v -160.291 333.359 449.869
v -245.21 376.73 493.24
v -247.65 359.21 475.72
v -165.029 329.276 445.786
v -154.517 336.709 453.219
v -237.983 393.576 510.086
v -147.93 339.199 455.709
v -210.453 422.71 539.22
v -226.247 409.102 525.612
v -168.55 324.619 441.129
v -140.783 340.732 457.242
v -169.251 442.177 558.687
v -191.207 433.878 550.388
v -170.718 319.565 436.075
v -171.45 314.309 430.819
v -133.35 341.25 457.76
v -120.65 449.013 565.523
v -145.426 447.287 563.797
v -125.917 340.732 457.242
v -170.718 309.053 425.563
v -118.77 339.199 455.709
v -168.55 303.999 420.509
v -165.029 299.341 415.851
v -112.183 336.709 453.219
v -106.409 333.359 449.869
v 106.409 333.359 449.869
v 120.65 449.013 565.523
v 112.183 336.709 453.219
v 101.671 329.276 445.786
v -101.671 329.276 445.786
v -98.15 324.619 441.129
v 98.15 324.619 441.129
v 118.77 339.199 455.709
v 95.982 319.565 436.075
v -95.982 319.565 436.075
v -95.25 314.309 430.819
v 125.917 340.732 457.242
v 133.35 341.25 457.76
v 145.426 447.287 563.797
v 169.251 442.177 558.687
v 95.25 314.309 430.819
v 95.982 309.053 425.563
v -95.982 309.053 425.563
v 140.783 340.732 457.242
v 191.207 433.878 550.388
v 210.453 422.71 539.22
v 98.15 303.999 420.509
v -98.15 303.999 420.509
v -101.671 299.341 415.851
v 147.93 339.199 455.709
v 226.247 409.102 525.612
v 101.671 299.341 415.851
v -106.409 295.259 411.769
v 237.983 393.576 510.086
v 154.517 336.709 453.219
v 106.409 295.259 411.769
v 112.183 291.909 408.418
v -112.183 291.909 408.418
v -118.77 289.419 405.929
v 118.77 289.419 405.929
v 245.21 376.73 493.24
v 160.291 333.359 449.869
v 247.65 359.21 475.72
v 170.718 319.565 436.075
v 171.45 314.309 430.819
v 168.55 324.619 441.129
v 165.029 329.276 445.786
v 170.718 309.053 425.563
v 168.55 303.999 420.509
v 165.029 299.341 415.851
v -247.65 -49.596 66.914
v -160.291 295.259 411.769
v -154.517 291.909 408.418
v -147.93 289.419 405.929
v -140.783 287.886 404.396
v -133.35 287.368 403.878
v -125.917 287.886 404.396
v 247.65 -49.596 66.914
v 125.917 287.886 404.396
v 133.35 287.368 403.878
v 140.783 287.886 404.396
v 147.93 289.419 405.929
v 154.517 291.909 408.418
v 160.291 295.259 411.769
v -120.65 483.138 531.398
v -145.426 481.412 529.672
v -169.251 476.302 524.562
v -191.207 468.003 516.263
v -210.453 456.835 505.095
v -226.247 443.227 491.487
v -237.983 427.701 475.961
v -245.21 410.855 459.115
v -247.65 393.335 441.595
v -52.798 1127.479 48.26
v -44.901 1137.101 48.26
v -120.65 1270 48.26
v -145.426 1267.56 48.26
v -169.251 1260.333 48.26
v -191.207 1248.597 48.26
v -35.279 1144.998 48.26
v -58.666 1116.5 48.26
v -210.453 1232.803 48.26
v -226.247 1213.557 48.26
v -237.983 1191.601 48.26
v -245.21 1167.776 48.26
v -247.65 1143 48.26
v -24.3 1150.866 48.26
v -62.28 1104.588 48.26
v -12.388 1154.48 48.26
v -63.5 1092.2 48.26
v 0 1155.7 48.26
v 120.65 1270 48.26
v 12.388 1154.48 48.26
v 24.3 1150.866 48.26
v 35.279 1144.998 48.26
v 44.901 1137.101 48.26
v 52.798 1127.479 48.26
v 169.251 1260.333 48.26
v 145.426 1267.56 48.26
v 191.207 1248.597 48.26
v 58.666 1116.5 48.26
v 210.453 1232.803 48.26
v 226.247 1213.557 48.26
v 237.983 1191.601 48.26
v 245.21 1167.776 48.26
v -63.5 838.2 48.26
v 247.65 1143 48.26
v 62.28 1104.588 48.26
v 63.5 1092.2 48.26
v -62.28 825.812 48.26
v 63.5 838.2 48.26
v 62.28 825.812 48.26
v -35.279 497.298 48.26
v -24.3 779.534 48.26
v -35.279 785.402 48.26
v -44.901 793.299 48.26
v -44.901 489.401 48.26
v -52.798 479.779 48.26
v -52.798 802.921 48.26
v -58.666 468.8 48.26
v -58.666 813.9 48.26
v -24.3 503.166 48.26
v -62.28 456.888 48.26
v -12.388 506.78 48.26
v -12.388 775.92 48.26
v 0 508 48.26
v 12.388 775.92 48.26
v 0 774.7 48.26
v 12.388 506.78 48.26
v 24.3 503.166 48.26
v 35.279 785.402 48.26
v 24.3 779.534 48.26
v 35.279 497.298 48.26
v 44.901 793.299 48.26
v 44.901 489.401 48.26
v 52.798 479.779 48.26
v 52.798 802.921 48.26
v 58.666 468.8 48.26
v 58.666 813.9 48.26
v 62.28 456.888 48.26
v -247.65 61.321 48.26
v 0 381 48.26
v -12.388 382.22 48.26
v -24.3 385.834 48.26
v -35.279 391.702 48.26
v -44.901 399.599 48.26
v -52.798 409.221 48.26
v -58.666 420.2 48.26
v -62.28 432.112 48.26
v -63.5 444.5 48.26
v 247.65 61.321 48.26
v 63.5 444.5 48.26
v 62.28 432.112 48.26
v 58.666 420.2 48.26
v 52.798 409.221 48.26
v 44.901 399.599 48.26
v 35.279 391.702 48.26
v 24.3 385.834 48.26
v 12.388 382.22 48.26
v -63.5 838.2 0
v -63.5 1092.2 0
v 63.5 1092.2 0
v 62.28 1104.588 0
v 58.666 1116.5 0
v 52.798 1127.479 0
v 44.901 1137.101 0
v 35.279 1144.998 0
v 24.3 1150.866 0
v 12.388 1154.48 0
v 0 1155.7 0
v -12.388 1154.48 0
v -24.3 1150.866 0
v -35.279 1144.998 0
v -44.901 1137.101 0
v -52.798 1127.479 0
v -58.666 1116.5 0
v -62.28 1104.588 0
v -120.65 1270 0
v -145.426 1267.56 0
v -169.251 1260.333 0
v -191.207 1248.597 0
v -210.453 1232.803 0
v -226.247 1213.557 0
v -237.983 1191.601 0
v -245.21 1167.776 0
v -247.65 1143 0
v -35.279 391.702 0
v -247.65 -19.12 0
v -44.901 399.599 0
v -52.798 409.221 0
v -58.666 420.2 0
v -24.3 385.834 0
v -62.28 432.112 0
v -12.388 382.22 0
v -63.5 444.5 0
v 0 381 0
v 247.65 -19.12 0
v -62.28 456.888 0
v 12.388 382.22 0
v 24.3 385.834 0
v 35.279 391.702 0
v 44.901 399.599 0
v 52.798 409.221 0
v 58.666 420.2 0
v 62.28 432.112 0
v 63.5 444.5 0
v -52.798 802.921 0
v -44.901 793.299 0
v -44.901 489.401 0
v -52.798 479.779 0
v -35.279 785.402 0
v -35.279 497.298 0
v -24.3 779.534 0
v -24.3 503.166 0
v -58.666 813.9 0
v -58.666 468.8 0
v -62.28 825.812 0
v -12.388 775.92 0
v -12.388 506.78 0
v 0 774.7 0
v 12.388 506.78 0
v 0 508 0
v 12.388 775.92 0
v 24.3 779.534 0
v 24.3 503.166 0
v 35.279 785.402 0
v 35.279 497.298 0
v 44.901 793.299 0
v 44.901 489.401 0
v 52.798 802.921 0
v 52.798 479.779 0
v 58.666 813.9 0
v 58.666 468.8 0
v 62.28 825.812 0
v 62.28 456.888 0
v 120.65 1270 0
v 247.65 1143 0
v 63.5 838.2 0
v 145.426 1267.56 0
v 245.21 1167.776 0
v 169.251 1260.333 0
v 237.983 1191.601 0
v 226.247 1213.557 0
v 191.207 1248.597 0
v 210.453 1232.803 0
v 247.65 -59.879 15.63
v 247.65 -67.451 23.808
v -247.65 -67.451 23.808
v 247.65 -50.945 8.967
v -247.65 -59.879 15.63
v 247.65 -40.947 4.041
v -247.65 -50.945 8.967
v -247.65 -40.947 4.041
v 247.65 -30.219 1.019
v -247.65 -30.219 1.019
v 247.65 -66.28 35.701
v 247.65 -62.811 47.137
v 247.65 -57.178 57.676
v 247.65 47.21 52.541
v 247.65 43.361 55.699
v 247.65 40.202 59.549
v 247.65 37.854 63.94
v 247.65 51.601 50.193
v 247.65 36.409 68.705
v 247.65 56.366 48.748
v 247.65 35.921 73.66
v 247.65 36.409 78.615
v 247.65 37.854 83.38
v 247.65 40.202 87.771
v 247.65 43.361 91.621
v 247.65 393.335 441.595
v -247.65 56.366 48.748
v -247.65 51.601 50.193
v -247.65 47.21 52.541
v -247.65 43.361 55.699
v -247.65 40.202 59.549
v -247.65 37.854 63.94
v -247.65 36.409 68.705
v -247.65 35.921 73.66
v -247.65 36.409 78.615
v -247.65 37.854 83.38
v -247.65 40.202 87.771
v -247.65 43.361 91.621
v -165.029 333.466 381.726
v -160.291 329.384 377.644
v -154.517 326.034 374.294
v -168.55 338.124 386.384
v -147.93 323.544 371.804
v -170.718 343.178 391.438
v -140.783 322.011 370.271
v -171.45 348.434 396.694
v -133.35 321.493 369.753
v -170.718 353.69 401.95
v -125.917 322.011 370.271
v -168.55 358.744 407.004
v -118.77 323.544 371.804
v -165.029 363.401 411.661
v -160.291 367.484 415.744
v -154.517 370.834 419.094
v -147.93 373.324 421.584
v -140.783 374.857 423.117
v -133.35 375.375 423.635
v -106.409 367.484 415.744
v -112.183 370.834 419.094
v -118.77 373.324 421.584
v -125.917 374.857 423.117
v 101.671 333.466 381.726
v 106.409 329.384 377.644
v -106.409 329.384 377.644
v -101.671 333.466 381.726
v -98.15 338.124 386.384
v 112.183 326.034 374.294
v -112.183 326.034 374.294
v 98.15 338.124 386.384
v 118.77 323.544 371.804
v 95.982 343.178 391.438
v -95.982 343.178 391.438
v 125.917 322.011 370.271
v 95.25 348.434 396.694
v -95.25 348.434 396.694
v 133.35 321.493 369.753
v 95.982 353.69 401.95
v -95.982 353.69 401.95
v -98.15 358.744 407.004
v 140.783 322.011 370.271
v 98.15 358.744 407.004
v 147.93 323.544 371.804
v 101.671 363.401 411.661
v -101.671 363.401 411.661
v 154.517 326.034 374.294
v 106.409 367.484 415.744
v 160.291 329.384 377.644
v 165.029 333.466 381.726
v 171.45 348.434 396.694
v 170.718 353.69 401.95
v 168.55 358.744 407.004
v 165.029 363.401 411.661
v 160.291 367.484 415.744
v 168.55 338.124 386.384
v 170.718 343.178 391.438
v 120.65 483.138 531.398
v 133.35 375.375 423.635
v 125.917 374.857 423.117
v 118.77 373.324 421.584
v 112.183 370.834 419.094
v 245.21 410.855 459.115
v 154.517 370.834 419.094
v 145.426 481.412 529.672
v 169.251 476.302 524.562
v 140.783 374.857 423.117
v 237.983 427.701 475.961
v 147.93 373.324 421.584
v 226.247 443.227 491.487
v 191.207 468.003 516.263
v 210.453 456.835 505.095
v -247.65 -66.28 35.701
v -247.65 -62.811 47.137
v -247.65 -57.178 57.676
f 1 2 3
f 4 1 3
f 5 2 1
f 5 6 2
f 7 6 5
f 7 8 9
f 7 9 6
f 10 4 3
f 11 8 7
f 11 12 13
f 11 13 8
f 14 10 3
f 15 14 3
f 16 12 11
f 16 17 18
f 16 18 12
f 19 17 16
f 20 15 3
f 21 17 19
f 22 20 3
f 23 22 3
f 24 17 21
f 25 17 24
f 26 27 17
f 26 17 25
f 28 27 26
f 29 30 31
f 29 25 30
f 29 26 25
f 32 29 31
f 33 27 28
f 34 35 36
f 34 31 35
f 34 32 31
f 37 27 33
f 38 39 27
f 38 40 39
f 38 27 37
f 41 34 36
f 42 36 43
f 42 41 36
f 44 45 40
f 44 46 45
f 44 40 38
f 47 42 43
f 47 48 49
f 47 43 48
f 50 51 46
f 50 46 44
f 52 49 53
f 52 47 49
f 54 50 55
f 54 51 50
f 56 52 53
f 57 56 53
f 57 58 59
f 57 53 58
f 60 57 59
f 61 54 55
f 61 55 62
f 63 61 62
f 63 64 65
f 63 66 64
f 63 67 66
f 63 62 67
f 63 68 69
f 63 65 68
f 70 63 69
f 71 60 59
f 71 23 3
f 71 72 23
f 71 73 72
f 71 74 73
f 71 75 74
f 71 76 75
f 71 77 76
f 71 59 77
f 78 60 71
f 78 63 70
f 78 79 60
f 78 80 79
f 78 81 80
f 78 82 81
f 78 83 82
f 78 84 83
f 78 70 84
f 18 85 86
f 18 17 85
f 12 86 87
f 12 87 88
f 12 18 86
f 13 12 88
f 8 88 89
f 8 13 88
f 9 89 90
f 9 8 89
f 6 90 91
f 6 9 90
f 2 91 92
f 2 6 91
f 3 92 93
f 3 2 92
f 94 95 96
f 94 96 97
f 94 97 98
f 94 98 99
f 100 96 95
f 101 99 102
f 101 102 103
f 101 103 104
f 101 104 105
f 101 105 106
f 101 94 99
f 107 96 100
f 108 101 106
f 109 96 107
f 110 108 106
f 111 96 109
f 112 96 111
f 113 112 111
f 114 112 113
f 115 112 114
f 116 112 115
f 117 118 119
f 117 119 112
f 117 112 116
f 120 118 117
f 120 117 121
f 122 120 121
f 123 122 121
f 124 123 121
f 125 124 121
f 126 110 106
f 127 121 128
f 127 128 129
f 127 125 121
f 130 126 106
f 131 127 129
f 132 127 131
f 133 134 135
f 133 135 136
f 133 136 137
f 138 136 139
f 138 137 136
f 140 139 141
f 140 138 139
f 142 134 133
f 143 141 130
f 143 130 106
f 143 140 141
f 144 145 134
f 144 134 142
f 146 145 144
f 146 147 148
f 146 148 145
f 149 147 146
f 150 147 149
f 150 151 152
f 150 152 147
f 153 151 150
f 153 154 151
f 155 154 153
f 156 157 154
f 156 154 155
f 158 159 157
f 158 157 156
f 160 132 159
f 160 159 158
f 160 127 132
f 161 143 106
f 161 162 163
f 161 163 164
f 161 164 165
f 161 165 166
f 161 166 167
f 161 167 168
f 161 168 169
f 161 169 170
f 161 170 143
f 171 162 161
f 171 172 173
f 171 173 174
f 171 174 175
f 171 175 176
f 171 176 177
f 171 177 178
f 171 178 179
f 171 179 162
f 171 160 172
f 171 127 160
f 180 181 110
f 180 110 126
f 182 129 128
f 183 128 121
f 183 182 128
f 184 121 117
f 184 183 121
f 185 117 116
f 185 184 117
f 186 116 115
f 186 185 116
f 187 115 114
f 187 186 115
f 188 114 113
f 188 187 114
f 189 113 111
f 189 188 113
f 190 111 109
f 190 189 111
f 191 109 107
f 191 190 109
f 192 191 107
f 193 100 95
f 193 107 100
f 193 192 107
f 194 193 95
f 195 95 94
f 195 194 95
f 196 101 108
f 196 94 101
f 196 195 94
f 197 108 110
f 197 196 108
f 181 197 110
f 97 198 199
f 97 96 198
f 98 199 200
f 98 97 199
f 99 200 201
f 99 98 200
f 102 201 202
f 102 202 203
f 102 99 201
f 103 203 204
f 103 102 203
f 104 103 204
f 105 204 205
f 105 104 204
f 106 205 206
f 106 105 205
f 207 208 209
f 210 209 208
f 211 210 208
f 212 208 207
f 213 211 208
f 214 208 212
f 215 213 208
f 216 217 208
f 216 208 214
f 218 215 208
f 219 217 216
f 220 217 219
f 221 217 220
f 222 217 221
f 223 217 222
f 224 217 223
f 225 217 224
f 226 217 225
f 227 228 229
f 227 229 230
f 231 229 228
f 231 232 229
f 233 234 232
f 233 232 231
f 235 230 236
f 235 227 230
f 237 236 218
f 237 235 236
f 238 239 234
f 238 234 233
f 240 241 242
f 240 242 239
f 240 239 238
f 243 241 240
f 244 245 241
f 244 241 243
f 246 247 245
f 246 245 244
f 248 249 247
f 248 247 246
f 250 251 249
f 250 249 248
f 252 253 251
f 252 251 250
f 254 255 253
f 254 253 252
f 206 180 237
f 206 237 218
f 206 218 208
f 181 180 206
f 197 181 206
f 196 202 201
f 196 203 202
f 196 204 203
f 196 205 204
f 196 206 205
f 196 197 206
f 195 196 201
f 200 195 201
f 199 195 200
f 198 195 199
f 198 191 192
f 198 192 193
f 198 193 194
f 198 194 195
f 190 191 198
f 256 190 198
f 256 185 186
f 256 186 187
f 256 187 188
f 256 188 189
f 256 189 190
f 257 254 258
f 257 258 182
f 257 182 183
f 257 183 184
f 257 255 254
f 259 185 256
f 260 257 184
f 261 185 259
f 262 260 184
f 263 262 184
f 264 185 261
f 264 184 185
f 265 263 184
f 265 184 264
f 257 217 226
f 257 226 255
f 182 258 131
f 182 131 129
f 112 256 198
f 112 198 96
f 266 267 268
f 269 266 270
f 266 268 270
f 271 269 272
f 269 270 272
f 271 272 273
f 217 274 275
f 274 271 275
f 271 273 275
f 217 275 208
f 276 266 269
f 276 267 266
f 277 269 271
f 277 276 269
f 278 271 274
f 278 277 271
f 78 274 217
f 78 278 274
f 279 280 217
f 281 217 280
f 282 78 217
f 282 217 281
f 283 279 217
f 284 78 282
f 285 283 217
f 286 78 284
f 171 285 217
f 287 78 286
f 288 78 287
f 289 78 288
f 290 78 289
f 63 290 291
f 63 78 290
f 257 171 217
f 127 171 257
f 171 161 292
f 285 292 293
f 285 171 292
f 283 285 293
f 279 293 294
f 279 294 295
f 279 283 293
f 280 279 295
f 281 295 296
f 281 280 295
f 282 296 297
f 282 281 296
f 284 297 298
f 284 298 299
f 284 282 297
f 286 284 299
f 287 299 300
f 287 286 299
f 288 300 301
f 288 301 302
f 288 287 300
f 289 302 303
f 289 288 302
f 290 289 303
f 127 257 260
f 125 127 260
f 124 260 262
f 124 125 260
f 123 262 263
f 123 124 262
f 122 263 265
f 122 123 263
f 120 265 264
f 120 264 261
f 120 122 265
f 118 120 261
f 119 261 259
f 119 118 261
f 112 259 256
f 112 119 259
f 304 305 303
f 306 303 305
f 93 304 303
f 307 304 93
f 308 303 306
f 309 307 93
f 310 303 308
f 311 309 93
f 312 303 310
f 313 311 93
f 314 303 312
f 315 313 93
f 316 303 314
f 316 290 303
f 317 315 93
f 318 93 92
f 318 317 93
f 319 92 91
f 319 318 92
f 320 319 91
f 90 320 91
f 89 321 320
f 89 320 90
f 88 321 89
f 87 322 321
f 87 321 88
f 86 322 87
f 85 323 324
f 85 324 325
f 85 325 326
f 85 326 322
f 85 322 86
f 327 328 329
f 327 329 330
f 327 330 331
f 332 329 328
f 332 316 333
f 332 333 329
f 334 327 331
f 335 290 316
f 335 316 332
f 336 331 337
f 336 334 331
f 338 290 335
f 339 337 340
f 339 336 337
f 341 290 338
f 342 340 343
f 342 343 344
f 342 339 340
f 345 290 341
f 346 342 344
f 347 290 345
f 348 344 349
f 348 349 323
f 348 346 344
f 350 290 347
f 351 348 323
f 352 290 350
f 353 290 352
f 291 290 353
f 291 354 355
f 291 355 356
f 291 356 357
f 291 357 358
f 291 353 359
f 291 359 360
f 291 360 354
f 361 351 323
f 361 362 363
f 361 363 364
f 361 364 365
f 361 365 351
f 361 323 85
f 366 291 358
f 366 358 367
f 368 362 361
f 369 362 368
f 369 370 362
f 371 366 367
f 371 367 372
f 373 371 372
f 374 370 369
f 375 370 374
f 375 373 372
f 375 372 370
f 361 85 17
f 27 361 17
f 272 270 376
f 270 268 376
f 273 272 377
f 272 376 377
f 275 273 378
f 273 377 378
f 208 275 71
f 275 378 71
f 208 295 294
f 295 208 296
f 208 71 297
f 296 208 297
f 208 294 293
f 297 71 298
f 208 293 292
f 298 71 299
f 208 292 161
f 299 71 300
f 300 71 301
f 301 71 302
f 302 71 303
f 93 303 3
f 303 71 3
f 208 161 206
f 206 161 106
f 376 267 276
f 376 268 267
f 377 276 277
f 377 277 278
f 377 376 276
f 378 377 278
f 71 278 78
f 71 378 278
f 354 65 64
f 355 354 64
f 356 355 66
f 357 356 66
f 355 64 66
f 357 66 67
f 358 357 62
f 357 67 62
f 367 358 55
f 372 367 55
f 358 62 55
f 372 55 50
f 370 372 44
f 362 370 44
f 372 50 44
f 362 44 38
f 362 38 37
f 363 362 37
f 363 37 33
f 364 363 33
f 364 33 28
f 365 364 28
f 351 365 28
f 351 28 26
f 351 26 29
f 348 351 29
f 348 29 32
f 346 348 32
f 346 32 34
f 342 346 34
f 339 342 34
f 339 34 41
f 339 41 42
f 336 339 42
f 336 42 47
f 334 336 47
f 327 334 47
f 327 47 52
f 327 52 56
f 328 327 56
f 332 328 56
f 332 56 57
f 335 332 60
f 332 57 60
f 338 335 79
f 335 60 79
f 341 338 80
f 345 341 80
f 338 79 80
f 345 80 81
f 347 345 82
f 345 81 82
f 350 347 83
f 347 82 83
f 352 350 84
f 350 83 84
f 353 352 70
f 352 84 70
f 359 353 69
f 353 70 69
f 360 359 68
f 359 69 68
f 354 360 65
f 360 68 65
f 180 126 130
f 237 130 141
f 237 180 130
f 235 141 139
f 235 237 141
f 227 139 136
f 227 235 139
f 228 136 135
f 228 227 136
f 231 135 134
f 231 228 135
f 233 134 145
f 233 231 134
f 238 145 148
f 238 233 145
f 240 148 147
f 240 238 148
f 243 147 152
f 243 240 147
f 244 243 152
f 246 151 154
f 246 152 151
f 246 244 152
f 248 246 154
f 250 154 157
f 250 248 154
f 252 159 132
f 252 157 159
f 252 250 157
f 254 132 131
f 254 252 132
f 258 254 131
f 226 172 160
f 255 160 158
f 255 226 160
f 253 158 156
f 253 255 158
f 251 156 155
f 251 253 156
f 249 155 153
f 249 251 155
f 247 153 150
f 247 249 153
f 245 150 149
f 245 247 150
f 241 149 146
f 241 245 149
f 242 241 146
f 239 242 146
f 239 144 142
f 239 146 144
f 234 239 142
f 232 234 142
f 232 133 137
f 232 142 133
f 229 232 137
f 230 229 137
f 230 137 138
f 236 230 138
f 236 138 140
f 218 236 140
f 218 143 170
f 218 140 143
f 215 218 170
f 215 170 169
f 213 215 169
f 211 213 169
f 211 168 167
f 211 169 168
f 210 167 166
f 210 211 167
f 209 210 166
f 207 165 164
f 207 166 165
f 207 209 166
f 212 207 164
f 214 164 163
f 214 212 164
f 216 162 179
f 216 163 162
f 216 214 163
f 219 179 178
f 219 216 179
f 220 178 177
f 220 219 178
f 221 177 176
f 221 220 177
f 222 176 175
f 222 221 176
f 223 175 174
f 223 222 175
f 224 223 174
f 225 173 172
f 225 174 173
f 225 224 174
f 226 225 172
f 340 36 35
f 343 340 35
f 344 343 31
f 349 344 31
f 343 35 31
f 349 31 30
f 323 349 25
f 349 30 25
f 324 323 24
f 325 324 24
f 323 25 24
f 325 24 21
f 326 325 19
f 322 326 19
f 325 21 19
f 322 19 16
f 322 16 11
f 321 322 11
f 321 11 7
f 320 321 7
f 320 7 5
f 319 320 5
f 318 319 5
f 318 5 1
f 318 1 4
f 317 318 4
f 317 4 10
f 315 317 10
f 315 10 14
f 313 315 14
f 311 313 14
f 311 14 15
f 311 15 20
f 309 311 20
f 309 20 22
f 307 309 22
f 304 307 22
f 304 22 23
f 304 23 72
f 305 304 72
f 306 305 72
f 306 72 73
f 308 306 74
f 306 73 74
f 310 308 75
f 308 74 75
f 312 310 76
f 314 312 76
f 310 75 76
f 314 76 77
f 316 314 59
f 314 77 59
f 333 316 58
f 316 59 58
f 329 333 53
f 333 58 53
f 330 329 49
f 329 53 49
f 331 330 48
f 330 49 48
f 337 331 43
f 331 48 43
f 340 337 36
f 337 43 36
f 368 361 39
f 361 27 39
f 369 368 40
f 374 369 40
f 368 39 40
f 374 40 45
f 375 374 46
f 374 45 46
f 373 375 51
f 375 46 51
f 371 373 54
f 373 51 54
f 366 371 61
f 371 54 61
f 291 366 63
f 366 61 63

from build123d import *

# Parameters (mm, degrees)
F1_DEPTH    = 247.65
F2_R        = 127
F3_R        = 25.4
F4_R        = 60.96
F5_T1_DEPTH = 736.9542394832
F6_R        = 38.1
F7_DEPTH    = 132.08
F8_R        = 63.5
F9_DEPTH    = 111.76


# Not quite as in the source:
# - a fillet or chamfer that OpenCascade refuses, or shapes differently, is made with other operations: its cross-section is extruded or revolved along the edge and cut away or added


with BuildPart() as f1:
    # F0 (on Right) → F1 (new body, symmetric)
    with BuildSketch(Plane.YZ):
        Polygon((-67.451213715, 0), (0, 0), (1270, 0), (1270, 48.26), (0, 48.26), (483.1377793135, 531.3977793135), (449.0128060535, 565.5227525736), (0, 116.5099465201), (-67.451213715, 49.0587328052), align=None)
    extrude(amount=F1_DEPTH, both=True)

    # F2
    f2_edges = [f1.edges().sort_by_distance(p)[0] for p in [
        (247.65, 466.075293, 548.460266),
        (-247.65, 466.075293, 548.460266),
        (247.65, 1270, 24.13),
        (-247.65, 1270, 24.13),
    ]]
    fillet(f2_edges, radius=F2_R)

    # F3
    f3_edges = [f1.edges().sort_by_distance(p)[0] for p in [
        (0, 0, 48.26),
    ]]
    fillet(f3_edges, radius=F3_R)

    # F4
    f4_edges = [f1.edges().sort_by_distance(p)[0] for p in [
        (0, -67.451214, 49.058733),
    ]]
    fillet(f4_edges, radius=F4_R)

    # F5: fillet of radius 60.96 on 1 edges, made by hand

    # F5_s2 → F5_t1 (cut)
    with BuildSketch(Plane.YZ.offset(-368.4771197416)):
        with BuildLine():
            ThreePointArc((-67.451213715, 23.8082740429), (-46.0587435131, 6.2750349075), (-19.1203658183, 0))
            Line((-19.1203658183, 0), (-67.451213715, 0))
            Line((-67.451213715, 0), (-67.451213715, 23.8082740429))
        make_face()
    extrude(amount=F5_T1_DEPTH, mode=Mode.SUBTRACT)

    # F6 (on face) → F7 (cut)
    with BuildSketch(Plane(origin=(0, -58.2549732601, 58.2549732601), x_dir=(1, 0, 0), z_dir=(0, -0.7071067812, 0.7071067812))):
        with Locations((-133.35, 526.8849732601)):
            Circle(F6_R)
        with Locations((133.35, 526.8849732601)):
            Circle(F6_R)
    extrude(amount=-F7_DEPTH, mode=Mode.SUBTRACT)

    # F8 (on Top) → F9 (cut)
    with BuildSketch(Plane.XY):
        with Locations((0, 444.5)):
            Circle(F8_R)
        with BuildLine():
            Line((-63.5, 838.2), (63.5, 838.2))
            ThreePointArc((63.5, 838.2), (0, 901.7), (-63.5, 838.2))
        make_face()
        with BuildLine():
            ThreePointArc((-63.5, 838.2), (0, 774.7), (63.5, 838.2))
            Line((63.5, 838.2), (-63.5, 838.2))
        make_face()
        with BuildLine():
            ThreePointArc((-63.5, 838.2), (0, 901.7), (63.5, 838.2))
            Line((63.5, 838.2), (63.5, 1092.2))
            ThreePointArc((63.5, 1092.2), (0, 1028.7), (-63.5, 1092.2))
            Line((-63.5, 1092.2), (-63.5, 838.2))
        make_face()
        with BuildLine():
            Line((-63.5, 1092.2), (63.5, 1092.2))
            ThreePointArc((63.5, 1092.2), (0, 1155.7), (-63.5, 1092.2))
        make_face()
        with BuildLine():
            ThreePointArc((-63.5, 1092.2), (0, 1028.7), (63.5, 1092.2))
            Line((63.5, 1092.2), (-63.5, 1092.2))
        make_face()
    extrude(amount=F9_DEPTH, mode=Mode.SUBTRACT)


solid = f1.part
